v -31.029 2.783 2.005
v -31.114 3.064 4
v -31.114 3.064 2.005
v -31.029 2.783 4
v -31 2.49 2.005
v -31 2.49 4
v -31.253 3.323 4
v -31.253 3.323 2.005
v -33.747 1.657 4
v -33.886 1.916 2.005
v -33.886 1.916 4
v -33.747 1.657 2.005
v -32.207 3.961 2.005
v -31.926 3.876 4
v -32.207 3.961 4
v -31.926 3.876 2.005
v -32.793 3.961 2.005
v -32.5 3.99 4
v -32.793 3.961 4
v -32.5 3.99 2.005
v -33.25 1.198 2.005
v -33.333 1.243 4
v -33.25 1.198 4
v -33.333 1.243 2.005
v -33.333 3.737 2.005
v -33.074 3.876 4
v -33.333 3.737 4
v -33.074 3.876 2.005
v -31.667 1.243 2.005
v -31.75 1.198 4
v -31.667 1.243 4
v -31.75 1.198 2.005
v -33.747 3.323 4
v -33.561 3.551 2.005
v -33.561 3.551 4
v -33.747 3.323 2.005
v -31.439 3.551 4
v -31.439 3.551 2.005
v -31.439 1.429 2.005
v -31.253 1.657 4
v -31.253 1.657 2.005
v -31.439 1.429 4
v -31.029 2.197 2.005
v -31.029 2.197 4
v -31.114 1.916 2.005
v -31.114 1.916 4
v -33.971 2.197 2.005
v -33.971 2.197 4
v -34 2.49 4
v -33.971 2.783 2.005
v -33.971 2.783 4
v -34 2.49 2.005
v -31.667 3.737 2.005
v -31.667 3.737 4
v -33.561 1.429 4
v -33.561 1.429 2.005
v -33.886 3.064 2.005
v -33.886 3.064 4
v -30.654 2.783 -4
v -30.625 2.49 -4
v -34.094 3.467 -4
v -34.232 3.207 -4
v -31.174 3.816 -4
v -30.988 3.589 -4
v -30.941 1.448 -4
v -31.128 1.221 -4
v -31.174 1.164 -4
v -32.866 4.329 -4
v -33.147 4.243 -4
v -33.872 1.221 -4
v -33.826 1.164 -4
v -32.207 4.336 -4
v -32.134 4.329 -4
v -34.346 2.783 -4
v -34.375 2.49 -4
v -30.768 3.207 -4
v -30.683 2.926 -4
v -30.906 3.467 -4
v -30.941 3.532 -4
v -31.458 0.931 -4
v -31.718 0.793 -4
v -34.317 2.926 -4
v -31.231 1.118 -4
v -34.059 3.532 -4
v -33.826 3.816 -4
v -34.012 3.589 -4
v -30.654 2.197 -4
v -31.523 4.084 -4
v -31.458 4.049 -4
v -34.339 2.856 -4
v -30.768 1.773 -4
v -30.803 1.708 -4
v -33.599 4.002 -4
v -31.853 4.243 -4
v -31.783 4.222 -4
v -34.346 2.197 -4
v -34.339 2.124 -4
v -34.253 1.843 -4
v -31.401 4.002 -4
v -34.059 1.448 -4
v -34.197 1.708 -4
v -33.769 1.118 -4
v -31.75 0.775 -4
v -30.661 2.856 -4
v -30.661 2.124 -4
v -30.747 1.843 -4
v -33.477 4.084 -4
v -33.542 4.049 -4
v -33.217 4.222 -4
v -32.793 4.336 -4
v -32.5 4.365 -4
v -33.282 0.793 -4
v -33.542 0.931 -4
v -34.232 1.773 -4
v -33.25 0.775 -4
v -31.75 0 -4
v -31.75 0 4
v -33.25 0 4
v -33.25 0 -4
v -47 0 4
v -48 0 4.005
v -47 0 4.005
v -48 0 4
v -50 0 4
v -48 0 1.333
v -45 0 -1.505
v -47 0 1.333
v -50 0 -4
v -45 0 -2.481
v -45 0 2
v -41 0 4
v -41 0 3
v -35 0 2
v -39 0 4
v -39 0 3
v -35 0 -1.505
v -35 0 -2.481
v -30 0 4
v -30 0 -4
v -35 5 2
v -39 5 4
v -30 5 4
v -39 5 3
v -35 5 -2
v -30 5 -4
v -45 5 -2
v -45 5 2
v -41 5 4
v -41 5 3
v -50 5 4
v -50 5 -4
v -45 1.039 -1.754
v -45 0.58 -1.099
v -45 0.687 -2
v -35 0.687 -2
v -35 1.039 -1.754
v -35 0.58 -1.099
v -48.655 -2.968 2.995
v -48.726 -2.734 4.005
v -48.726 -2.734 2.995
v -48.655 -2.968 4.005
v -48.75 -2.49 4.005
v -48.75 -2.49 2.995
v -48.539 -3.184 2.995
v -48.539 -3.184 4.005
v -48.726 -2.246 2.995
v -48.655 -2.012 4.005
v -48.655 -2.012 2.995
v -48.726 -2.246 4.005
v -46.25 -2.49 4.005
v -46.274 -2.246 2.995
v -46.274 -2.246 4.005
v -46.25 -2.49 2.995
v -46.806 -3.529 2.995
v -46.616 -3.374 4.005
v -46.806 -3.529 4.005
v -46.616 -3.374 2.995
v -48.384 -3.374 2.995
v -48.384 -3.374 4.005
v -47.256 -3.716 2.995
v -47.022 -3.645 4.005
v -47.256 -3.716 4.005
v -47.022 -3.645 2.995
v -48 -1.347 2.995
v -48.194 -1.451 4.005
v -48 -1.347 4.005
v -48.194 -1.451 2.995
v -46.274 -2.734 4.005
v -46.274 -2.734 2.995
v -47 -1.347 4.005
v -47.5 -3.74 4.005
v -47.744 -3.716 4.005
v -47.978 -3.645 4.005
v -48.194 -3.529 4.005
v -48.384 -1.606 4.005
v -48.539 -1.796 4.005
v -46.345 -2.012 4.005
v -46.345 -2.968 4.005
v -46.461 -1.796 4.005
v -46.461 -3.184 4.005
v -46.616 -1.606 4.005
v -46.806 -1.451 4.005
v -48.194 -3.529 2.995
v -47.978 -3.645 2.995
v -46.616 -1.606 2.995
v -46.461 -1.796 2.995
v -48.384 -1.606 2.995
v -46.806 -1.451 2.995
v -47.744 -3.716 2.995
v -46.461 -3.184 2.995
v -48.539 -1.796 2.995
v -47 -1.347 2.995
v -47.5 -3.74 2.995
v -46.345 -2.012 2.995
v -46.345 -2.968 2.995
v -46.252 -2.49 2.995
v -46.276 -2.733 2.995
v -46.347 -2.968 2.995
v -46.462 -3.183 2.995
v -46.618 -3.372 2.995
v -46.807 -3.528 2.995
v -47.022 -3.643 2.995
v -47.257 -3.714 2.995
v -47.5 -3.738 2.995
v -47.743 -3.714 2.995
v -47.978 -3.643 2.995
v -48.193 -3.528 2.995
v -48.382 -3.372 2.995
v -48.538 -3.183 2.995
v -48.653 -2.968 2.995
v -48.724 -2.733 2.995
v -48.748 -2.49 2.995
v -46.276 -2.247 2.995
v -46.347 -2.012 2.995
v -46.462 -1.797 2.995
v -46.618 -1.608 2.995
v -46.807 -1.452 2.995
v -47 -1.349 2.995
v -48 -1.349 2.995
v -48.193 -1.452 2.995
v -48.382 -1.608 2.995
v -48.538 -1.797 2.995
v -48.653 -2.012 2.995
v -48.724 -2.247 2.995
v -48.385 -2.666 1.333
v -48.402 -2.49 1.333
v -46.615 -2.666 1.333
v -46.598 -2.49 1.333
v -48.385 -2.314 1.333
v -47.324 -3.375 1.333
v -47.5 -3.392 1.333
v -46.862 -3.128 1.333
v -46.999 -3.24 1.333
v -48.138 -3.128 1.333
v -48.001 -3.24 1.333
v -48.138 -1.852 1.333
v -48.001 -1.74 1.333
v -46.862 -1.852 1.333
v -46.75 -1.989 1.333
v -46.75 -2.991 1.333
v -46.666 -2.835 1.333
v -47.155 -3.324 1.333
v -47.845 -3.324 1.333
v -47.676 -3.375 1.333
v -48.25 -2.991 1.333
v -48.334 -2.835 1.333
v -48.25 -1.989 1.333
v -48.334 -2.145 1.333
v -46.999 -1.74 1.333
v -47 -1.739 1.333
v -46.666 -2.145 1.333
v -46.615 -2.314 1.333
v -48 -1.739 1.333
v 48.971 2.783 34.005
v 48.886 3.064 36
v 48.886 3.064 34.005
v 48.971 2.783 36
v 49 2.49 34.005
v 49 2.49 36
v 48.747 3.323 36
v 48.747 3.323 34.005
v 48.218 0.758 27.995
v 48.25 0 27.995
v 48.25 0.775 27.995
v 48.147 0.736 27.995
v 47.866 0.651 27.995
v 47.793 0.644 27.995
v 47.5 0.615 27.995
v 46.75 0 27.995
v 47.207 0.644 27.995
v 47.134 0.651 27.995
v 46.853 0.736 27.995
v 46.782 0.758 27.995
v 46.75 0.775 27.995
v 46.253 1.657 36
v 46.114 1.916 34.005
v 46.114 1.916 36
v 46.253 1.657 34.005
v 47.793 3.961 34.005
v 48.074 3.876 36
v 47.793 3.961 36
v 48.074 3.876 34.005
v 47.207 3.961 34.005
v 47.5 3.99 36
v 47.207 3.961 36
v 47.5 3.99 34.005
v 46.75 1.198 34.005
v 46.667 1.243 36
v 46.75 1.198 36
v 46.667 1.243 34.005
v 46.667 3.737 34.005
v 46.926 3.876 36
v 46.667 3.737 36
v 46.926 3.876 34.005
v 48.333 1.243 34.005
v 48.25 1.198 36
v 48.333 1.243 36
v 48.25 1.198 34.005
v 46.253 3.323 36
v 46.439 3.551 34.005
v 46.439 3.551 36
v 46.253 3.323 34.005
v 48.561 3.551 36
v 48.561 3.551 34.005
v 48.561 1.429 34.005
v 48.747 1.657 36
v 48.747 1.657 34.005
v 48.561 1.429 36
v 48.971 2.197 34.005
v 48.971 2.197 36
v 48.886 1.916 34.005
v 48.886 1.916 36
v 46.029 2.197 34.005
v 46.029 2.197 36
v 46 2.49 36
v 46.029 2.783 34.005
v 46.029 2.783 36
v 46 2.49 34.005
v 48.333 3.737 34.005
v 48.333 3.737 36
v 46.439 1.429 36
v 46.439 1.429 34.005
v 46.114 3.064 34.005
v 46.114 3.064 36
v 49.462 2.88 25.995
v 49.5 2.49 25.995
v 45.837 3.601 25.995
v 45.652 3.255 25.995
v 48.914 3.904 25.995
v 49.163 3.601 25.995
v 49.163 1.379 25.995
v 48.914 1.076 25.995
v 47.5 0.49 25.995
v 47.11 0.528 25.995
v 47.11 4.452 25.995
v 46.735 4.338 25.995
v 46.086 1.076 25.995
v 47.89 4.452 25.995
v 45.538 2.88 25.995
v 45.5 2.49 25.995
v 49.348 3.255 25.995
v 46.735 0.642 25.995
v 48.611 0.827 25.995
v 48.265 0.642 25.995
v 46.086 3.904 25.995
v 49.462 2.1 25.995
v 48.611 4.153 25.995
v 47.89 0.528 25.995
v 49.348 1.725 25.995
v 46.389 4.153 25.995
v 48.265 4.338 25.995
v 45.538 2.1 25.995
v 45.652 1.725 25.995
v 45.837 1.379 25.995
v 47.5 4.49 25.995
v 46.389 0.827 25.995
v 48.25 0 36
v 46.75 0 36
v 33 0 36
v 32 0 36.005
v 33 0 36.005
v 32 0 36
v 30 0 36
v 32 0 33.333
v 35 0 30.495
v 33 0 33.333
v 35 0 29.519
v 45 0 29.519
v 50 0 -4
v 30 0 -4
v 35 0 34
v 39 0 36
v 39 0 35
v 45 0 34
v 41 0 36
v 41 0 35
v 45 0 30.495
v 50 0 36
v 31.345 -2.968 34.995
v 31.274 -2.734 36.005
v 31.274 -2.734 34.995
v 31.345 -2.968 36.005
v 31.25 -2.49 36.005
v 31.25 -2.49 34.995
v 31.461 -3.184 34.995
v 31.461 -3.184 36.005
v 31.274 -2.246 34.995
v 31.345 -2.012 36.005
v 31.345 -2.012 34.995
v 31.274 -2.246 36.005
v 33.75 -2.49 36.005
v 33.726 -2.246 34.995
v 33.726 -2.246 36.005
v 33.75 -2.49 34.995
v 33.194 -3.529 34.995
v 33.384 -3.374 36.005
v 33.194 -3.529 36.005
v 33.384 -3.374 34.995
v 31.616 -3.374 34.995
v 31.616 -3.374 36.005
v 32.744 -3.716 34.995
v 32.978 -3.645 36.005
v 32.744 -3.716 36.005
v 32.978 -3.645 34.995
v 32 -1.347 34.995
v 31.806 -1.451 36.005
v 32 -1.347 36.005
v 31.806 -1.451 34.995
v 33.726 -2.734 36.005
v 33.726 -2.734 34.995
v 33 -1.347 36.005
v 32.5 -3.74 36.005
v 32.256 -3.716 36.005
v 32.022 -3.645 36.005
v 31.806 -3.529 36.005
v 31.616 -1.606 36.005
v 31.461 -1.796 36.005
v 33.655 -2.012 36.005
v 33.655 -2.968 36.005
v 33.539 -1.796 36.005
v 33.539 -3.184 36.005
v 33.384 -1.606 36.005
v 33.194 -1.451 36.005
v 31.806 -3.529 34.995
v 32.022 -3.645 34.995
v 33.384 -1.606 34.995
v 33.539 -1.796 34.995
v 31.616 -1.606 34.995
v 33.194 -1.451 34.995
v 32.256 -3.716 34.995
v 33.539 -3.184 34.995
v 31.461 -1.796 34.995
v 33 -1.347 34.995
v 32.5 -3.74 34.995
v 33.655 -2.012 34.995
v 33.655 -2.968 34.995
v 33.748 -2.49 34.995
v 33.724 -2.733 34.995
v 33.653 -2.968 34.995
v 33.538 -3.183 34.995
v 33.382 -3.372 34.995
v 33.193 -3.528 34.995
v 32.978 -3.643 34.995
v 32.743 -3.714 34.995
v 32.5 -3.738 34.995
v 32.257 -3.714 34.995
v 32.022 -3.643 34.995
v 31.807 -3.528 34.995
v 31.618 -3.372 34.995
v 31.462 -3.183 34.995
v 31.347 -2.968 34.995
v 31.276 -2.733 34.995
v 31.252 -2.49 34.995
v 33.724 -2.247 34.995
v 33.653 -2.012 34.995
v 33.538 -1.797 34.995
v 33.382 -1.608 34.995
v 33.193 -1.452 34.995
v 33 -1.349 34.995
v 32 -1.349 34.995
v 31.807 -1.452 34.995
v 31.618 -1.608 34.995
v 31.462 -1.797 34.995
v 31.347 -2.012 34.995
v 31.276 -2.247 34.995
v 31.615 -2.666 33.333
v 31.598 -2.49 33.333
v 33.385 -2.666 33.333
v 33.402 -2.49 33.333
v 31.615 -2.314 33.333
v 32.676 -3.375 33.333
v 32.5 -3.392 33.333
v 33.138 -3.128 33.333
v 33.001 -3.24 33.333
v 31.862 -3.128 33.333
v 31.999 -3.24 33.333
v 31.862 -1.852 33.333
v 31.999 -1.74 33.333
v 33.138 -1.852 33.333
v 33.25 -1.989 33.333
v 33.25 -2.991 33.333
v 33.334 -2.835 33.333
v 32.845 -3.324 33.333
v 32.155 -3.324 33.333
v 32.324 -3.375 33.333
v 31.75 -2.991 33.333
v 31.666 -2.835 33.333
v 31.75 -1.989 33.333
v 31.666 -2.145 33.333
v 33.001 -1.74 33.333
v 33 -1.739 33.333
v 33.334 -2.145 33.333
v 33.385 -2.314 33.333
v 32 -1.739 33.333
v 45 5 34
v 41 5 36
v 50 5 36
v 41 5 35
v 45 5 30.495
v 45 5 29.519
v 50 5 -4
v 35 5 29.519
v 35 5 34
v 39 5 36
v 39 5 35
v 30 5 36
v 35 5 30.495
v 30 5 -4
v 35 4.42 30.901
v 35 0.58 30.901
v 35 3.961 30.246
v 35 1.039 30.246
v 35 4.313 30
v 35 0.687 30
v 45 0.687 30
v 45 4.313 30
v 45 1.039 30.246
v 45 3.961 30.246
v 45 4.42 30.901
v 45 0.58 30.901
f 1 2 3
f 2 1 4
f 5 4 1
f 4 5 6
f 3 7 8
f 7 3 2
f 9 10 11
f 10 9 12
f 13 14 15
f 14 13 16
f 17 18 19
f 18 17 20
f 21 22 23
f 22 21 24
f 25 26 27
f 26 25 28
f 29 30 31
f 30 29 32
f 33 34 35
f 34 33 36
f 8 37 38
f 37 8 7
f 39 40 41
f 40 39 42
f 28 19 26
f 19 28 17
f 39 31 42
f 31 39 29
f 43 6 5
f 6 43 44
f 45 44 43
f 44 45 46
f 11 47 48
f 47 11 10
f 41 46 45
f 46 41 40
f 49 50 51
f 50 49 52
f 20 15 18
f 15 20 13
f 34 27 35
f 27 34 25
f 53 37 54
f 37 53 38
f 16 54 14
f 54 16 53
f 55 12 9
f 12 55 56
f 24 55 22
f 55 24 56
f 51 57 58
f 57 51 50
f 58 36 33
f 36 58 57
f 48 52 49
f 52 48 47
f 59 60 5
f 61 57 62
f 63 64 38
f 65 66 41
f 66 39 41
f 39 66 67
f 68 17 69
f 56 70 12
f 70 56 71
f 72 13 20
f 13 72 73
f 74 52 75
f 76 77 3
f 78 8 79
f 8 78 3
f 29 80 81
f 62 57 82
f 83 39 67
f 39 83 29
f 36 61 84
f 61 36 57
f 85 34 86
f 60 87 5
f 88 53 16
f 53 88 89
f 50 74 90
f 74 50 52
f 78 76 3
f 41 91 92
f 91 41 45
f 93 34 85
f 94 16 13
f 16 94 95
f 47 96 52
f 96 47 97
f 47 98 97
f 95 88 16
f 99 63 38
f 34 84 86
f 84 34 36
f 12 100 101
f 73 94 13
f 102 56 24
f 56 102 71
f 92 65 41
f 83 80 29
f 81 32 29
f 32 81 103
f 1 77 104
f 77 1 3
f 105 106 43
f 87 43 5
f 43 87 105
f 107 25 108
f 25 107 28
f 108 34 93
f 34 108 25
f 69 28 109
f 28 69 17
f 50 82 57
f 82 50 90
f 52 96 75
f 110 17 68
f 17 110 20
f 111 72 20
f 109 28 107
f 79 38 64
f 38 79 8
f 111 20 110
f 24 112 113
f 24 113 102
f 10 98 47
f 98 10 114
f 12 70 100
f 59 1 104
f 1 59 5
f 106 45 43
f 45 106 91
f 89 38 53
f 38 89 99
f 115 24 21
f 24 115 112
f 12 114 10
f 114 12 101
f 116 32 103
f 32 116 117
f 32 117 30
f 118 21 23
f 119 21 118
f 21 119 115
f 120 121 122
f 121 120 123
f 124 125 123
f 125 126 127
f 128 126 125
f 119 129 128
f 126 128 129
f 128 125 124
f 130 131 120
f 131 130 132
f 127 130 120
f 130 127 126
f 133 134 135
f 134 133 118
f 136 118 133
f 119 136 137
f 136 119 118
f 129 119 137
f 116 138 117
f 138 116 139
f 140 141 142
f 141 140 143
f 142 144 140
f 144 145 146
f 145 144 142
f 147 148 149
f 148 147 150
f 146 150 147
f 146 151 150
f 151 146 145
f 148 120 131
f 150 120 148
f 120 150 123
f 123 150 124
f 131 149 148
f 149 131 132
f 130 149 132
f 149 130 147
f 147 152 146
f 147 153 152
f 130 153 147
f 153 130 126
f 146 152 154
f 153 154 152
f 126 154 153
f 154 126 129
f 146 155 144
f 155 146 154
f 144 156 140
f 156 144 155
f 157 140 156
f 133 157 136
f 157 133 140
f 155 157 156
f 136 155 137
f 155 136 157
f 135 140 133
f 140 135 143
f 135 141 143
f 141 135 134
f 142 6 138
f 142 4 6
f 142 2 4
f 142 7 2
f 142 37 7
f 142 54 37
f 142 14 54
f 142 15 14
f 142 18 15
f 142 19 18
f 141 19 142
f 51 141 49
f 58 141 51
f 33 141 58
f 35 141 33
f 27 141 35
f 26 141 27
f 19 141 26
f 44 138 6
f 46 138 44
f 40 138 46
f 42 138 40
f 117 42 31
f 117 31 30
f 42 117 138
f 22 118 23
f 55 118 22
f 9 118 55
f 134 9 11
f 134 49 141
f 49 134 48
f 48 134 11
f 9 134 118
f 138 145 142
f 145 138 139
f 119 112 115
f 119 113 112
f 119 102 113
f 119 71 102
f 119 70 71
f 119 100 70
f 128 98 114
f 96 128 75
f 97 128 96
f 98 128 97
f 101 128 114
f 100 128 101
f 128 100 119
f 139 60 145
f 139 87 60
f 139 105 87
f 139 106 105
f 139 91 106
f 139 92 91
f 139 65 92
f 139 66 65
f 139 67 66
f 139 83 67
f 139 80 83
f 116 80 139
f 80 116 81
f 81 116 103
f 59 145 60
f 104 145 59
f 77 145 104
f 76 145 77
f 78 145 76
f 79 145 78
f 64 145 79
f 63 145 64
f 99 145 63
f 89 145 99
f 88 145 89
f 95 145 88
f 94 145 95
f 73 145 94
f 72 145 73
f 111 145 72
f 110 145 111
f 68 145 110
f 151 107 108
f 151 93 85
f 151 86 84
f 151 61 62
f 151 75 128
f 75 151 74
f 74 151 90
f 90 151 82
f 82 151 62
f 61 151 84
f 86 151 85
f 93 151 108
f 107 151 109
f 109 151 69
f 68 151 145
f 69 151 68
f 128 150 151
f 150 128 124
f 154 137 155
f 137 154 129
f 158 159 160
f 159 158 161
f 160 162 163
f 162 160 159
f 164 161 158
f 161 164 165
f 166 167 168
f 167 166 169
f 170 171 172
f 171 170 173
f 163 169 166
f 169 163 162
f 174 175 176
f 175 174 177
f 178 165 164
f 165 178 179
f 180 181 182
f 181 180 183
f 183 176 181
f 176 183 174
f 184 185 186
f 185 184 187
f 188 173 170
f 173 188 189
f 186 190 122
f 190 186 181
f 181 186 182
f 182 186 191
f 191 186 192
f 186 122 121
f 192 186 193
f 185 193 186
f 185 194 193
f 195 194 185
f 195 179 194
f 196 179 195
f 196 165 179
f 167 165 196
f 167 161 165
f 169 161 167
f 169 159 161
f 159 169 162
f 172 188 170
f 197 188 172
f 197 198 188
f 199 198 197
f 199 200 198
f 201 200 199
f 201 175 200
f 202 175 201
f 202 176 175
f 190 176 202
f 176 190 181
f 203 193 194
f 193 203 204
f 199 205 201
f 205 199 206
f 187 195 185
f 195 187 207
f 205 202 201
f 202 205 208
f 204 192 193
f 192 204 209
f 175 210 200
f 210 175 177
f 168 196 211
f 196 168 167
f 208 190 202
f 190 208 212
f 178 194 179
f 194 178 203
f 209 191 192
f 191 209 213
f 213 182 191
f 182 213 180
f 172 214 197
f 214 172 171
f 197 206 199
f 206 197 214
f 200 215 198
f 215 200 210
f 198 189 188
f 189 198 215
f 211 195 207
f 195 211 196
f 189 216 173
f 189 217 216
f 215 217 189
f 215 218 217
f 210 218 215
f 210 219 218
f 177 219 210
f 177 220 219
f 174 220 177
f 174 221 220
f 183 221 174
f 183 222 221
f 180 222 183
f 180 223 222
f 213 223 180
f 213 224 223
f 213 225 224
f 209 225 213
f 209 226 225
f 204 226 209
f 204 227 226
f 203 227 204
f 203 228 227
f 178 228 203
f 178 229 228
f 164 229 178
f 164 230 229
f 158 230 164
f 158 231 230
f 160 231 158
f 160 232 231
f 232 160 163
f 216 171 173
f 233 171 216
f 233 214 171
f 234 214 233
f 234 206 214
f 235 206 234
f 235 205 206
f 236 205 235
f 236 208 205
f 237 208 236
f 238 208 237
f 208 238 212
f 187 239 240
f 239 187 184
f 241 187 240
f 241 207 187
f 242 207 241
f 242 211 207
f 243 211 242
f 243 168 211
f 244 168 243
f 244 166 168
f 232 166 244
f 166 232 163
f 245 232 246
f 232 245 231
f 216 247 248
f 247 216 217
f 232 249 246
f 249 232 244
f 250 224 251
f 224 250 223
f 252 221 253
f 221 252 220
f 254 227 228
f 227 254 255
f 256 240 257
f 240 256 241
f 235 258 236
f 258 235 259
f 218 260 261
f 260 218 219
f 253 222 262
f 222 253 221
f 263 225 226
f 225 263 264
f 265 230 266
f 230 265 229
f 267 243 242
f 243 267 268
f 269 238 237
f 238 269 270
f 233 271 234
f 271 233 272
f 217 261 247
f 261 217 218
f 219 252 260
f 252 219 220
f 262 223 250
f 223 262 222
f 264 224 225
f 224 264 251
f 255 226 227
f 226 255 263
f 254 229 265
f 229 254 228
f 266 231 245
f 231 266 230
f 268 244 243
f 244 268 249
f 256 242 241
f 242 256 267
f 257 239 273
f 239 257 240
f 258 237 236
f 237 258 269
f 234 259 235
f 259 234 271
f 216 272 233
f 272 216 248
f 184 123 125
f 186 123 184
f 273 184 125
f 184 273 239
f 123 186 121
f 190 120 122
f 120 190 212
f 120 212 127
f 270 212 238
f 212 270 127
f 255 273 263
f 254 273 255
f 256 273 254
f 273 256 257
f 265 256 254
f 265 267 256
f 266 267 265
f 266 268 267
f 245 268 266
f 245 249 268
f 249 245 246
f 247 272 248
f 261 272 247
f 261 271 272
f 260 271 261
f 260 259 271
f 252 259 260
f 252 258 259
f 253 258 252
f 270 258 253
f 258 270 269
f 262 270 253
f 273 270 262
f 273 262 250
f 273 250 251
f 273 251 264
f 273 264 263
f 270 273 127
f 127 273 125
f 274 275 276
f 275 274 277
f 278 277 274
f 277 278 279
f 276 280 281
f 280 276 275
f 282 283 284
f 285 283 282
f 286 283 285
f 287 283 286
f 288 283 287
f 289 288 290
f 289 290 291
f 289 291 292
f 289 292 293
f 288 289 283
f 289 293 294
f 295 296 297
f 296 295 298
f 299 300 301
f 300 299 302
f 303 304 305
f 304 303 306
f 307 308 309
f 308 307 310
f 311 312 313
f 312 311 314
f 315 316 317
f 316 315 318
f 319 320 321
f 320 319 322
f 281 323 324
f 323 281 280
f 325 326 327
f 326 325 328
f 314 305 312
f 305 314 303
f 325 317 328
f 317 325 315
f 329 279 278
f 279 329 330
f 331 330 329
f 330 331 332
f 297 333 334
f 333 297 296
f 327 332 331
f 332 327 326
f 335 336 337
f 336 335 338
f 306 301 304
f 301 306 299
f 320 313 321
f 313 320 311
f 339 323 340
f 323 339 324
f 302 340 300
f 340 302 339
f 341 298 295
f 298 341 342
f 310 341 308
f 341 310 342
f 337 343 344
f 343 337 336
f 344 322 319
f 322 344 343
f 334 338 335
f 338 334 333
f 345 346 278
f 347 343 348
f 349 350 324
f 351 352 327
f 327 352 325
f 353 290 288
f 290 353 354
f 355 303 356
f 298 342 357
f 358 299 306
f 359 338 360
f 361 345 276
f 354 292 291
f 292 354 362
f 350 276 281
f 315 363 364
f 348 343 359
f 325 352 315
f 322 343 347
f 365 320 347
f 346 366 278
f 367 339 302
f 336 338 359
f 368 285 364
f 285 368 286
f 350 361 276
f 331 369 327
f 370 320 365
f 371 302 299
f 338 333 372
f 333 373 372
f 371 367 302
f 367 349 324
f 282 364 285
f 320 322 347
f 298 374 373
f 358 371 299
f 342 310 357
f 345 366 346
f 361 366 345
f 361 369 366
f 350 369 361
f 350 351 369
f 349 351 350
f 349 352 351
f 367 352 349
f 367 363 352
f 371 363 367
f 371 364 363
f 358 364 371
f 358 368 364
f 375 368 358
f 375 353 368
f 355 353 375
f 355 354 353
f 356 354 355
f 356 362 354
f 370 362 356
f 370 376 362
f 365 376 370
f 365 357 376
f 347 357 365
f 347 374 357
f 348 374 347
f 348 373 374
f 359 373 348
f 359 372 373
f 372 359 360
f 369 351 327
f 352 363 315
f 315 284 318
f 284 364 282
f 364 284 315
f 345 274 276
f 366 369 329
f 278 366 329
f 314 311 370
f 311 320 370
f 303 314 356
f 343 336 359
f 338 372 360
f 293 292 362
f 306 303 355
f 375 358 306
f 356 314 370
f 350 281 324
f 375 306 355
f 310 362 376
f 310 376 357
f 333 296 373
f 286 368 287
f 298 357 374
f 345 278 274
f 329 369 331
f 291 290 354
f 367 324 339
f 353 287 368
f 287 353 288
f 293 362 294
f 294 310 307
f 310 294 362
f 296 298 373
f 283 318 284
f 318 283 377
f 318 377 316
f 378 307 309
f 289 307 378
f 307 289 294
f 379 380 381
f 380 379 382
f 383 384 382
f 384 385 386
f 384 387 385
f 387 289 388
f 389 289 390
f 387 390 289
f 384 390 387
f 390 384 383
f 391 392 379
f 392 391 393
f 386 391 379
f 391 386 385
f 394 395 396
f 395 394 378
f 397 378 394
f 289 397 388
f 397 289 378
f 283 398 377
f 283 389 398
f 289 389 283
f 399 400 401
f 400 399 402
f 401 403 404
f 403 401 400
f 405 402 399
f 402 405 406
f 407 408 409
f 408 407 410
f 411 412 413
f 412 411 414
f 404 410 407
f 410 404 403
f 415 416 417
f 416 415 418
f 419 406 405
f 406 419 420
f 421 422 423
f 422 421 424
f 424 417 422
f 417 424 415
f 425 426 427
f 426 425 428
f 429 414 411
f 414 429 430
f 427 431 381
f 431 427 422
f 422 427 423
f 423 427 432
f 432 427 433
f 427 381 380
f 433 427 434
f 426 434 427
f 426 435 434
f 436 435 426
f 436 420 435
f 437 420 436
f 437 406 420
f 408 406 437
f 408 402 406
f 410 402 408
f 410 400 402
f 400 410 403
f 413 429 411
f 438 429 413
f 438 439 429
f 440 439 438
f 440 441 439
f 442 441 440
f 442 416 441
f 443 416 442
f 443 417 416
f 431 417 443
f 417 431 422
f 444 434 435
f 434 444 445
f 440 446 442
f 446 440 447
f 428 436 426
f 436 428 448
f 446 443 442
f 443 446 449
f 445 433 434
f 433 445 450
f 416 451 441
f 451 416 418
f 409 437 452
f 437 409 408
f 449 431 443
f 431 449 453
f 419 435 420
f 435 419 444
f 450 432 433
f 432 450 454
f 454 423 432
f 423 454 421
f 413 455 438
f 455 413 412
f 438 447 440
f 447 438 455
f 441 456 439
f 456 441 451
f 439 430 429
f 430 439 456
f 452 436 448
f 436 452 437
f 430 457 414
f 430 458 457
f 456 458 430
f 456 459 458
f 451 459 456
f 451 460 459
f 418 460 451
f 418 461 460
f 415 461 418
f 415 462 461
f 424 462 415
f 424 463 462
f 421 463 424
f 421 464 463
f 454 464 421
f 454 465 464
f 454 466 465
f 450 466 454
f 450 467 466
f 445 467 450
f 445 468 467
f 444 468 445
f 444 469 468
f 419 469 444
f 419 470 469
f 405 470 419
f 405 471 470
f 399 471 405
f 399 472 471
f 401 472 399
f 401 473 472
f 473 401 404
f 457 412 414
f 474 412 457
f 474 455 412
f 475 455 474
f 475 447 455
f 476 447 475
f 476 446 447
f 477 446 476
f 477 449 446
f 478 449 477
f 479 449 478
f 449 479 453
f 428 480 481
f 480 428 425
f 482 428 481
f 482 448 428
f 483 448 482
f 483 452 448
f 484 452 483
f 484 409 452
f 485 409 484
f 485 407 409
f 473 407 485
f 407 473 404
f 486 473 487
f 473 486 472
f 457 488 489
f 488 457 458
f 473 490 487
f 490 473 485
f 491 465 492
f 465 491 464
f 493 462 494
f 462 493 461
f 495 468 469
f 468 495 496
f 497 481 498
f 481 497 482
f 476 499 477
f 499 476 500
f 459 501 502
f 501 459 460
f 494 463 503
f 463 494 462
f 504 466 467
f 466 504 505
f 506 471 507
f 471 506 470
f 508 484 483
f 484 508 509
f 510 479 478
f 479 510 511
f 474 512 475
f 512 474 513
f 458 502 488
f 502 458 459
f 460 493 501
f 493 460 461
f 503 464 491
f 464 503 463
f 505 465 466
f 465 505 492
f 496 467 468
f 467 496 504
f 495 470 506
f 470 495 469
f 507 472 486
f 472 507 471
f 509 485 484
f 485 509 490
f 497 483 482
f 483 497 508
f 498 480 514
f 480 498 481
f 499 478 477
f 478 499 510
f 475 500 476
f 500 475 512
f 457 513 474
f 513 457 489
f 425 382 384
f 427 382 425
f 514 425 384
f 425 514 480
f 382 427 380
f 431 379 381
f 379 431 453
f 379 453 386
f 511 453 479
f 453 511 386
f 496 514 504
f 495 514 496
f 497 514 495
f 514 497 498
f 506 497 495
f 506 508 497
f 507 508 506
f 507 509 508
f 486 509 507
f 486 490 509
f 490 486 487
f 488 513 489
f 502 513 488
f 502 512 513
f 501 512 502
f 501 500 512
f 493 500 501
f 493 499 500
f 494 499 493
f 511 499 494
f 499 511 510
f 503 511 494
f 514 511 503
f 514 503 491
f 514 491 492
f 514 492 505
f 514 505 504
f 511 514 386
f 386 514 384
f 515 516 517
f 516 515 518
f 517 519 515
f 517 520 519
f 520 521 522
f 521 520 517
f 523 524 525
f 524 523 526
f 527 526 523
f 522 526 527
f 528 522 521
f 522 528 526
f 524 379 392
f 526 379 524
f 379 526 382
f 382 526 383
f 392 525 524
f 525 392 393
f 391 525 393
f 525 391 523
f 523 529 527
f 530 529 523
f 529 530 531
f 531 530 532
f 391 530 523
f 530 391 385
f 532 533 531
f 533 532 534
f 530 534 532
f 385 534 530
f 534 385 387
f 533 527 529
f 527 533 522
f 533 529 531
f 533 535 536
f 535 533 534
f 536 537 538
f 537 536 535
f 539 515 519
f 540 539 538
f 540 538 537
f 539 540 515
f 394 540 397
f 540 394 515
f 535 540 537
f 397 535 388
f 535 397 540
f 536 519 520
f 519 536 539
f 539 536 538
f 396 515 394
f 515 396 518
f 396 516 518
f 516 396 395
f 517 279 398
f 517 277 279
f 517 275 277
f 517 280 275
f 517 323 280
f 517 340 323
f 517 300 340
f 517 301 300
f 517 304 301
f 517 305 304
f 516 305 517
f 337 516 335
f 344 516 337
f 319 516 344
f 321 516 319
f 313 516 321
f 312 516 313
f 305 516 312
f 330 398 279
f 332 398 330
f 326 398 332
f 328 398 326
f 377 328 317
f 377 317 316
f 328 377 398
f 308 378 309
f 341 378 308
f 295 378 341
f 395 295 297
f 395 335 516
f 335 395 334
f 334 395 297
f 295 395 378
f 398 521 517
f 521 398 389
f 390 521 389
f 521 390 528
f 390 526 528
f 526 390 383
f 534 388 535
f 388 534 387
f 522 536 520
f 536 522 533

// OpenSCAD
/*

  ttt_curve180m_ramp_3.scad

  (c) olikraus@gmail.com

  This work is licensed under the Creative Commons Attribution-NonCommercial-ShareAlike 4.0 International License. 
  To view a copy of this license, visit http://creativecommons.org/licenses/by-nc-sa/4.0/.

*/
include <train_tube_track.scad>;


ttt_curved180m_ramp_3();

//platform();
